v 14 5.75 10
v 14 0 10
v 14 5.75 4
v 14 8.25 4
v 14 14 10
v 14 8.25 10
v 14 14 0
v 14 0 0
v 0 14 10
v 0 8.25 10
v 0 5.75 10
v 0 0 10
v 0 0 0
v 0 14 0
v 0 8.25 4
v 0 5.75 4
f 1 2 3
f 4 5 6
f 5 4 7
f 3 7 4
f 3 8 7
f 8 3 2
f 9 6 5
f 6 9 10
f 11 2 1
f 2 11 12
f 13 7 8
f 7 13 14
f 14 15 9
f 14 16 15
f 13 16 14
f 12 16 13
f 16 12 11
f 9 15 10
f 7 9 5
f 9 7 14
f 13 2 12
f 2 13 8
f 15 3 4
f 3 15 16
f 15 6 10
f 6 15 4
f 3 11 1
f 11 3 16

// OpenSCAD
$fn = 32;

// ----------------------------------------------------------------------
// Micro clip: slotted block, 5-20 mm class
// ----------------------------------------------------------------------

// --- parameters (mm) ---
block_l = 14;             // block length, X
block_w = 14;             // block width, Y
block_h = 10;             // block height, Z
slot_w = 2.5;             // slot width
slot_d = 6;               // slot depth from the top

difference() {
  cube([block_l, block_w, block_h]);
  translate([-1, block_w / 2 - slot_w / 2, block_h - slot_d])
    cube([block_l + 2, slot_w, slot_d + 1]);
}
